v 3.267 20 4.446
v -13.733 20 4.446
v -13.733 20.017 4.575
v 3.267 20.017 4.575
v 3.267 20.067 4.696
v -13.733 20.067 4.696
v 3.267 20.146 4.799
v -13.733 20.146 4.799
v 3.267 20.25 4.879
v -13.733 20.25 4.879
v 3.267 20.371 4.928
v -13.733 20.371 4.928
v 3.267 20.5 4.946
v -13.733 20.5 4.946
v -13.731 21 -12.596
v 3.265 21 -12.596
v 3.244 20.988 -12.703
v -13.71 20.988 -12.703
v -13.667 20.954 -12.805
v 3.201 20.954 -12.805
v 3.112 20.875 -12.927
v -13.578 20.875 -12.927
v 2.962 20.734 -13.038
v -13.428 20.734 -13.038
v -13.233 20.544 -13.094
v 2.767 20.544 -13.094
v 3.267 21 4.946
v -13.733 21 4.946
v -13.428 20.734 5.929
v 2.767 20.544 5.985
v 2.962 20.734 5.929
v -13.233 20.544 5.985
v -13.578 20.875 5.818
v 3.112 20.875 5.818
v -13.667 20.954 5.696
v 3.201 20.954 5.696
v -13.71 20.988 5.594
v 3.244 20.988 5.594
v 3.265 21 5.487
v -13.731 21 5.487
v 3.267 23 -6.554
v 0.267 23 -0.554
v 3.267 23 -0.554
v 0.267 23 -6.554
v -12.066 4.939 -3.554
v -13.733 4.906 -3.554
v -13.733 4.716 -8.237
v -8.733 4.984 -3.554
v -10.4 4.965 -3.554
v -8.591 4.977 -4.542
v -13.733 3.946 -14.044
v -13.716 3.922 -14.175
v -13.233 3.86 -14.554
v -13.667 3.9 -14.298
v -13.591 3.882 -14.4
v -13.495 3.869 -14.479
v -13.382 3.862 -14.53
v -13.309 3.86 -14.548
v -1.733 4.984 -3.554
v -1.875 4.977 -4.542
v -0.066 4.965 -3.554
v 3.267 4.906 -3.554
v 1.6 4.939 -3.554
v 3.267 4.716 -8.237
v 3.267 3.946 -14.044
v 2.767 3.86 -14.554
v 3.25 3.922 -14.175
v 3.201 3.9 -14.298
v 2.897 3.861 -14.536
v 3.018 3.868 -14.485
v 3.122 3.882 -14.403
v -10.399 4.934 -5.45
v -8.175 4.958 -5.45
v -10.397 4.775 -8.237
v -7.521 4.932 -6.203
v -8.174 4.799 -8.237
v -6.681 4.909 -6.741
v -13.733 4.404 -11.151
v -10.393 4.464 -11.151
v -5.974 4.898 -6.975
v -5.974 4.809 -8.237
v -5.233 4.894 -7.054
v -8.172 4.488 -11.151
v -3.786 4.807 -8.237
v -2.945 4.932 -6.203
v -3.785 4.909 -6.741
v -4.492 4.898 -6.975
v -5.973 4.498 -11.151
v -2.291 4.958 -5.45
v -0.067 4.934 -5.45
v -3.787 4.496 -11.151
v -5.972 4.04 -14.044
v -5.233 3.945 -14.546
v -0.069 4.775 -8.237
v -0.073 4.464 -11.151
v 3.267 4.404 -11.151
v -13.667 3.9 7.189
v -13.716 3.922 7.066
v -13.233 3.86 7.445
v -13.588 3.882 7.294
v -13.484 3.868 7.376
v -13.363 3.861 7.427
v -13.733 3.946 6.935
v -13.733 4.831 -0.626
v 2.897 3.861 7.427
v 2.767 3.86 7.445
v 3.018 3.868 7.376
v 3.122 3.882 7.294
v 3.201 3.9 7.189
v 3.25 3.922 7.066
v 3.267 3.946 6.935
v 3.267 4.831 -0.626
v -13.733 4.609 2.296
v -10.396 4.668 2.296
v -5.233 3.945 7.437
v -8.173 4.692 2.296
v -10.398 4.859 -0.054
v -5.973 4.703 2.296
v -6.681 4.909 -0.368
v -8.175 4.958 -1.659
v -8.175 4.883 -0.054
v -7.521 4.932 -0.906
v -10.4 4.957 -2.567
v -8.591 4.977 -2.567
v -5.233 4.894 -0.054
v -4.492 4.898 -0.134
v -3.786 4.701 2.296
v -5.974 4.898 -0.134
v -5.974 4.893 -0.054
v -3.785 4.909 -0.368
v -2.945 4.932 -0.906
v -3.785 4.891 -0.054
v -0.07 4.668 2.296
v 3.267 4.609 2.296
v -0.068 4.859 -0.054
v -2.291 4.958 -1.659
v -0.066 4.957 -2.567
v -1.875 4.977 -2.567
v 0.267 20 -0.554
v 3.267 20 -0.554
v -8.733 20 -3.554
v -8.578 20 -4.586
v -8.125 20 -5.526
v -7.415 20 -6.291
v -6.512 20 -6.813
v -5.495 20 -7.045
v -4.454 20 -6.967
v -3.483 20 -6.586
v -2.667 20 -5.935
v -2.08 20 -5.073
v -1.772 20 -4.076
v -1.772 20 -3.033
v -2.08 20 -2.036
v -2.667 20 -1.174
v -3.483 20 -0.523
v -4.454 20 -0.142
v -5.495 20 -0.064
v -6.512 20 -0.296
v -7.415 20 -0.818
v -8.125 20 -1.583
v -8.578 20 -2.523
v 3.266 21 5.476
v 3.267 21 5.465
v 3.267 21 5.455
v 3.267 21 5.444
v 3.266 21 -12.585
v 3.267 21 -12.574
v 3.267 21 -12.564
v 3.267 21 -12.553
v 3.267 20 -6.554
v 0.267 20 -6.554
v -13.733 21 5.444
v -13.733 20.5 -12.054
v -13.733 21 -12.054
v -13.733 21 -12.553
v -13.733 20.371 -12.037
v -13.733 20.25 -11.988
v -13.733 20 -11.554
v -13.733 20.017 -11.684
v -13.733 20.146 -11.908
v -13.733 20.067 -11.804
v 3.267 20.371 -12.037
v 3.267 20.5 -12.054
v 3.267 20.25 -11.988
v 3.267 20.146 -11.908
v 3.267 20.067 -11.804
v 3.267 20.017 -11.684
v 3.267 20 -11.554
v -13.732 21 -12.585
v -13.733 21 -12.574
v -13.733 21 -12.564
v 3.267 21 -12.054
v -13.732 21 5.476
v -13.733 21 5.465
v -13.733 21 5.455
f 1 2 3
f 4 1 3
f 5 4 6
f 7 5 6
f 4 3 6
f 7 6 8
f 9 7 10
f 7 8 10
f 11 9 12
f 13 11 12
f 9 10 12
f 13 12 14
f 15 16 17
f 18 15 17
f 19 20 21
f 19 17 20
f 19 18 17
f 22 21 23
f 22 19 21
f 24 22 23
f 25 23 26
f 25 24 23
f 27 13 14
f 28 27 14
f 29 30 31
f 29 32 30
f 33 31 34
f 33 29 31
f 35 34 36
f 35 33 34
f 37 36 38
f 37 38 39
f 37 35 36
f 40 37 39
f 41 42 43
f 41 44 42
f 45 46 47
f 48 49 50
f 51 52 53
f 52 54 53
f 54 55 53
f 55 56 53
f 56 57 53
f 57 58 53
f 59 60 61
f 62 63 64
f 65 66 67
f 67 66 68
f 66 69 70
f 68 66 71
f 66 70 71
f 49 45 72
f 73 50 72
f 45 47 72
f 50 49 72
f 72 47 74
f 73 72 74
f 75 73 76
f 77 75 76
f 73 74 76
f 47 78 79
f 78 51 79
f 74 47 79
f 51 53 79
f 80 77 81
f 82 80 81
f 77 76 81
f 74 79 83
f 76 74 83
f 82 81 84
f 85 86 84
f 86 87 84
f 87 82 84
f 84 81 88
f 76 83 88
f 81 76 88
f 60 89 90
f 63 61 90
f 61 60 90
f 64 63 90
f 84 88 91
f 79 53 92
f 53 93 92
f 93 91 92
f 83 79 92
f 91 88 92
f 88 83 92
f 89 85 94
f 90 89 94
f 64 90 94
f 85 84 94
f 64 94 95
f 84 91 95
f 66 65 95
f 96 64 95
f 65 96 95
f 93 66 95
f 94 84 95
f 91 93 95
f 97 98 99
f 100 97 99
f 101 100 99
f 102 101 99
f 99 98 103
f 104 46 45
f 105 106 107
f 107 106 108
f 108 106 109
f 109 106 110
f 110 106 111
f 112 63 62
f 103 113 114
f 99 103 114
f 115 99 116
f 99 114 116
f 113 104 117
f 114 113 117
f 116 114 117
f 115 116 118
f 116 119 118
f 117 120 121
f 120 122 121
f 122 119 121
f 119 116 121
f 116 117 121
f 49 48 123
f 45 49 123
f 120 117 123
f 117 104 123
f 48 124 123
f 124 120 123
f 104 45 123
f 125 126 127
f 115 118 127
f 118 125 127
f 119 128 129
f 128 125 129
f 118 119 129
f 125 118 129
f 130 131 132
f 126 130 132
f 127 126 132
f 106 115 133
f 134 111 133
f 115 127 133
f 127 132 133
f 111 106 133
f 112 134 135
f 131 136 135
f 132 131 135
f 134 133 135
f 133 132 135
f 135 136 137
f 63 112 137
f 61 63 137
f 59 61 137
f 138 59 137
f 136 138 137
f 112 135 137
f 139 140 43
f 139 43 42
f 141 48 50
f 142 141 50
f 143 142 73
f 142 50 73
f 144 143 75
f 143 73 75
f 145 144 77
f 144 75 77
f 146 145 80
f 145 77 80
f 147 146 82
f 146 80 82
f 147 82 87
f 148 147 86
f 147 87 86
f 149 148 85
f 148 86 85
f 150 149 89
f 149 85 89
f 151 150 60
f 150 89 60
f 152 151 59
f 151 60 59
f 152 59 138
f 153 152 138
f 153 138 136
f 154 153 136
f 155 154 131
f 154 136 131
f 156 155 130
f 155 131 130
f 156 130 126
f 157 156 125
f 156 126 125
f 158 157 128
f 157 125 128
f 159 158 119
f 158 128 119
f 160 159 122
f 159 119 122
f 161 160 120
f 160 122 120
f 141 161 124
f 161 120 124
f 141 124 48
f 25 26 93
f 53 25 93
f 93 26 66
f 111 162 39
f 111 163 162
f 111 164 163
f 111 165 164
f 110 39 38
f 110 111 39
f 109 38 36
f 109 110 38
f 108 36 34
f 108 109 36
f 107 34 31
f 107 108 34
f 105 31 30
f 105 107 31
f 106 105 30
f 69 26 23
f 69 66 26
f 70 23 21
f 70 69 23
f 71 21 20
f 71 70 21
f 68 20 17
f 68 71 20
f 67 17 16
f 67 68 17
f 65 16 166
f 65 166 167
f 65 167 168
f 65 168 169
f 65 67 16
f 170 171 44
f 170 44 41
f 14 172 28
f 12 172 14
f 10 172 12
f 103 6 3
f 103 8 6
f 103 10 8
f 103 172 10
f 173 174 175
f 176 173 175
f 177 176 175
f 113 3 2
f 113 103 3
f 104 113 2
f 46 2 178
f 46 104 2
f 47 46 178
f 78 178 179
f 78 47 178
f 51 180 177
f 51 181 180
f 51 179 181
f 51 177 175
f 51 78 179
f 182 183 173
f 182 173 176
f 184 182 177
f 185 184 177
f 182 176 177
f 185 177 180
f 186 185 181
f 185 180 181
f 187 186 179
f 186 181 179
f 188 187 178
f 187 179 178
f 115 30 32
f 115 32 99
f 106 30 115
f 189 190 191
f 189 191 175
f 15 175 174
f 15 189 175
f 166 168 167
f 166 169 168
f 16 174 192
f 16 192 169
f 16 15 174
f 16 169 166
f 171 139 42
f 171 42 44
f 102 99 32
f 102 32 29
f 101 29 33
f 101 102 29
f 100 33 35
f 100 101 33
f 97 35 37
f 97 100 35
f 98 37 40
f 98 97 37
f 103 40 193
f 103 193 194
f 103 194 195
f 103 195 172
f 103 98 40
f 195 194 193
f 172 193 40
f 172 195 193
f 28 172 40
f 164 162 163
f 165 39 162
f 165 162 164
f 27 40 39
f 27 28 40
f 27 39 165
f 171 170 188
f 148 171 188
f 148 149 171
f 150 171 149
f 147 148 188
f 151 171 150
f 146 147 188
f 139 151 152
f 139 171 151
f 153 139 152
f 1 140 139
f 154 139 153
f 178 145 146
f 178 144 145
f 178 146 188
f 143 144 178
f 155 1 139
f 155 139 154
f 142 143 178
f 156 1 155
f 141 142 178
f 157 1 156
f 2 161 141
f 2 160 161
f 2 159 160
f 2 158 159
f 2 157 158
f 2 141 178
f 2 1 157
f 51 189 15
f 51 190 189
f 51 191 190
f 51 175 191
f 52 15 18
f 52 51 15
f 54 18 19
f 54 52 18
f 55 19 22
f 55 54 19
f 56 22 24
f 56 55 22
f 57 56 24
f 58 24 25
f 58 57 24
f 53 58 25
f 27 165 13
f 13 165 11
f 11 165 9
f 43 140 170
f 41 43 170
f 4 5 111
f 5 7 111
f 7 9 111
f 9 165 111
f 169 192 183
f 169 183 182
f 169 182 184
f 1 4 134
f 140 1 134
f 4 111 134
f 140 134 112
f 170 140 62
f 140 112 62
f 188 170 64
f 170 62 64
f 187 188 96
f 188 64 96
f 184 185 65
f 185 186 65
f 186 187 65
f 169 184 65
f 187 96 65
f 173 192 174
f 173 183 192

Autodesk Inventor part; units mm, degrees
ref_plane "YZ Plane" through (0, 0, 0) normal (1, 0, 0) x (0, 1, 0)
ref_plane "XZ Plane" through (0, 0, 0) normal (0, 1, 0) x (-1, 0, 0)
ref_plane "XY Plane" through (0, 0, 0) normal (0, 0, 1) x (1, 0, 0)
sketch "Sketch1" plane through (0, 0, 0) normal (0, 1, 0) x (-1, 0, 0)
  line L0 (5.232996, 7.4455) -> (-11.767004, 7.4455)
  line L1 (-11.767004, 7.4455) -> (-11.767004, -14.5545)
  line L2 (-11.767004, -14.5545) -> (5.232996, -14.5545)
  circle A0 centre (-3.267004, -3.5545) radius 3.5
  line L3 (5.232996, 7.4455) -> (5.232996, -14.5545)
  point P0 (0, 0)
  dimension "d2" = 22
  dimension "d3" = 17
  dimension "d8" = 7
  dimension "d10" = 11
  dimension "d11" = 8.5
extrude "Extrusion1" add sketch "Sketch1" along normal blind 20
sketch "Sketch2" plane through (0, 20, 0) normal (0, 1, 0) x (1, 0, 0)
  line L0 (-5.232996, -7.4455) -> (11.767004, -7.4455)
  line L1 (11.767004, -7.4455) -> (11.767004, 14.5545)
  line L2 (-5.232996, -7.4455) -> (11.767004, -7.4455)
  line L3 (11.767004, -7.4455) -> (11.767004, -4.9455)
  line L4 (11.767004, -4.9455) -> (-5.232996, -4.9455)
  line L5 (-5.232996, -4.9455) -> (-5.232996, -7.4455)
  line L6 (-5.232996, 14.5545) -> (-5.232996, -7.4455)
  line L7 (-5.232996, 14.5545) -> (11.767004, 14.5545)
  line L8 (11.767004, 14.5545) -> (11.767004, 12.0545)
  line L9 (11.767004, 12.0545) -> (-5.232996, 12.0545)
  line L10 (-5.232996, 12.0545) -> (-5.232996, 14.5545)
  line L11 (11.767004, 0.5545) -> (8.767004, 0.5545)
  line L12 (8.767004, 0.5545) -> (8.767004, 6.5545)
  line L13 (8.767004, 6.5545) -> (11.767004, 6.5545)
  line L14 (11.767004, 6.5545) -> (11.767004, 0.5545)
  line L15 (11.767004, 0.5545) -> (8.767004, 0.5545)
  line L16 (8.767004, 0.5545) -> (8.767004, 6.5545)
  line L17 (8.767004, 6.5545) -> (11.767004, 6.5545)
  line L18 (11.767004, 6.5545) -> (11.767004, 0.5545)
  point P0 (0, 0)
  dimension "d14" = 2.5
  dimension "d15" = 2.5
  dimension "d16" = 3
  dimension "d17" = 6
  dimension "d18" = 8
extrude "Extrusion2" add sketch "Sketch2" along normal blind 1 contours L5 L4 L1 L0 | L6 L7 L1 L9
sketch "Sketch3" plane through (0, 20, 0) normal (0, 1, 0) x (1, 0, 0)
  line L0 (11.767004, -4.9455) -> (11.767004, 12.0545)
  line L1 (11.767004, 0.5545) -> (8.767004, 0.5545)
  line L2 (8.767004, 0.5545) -> (8.767004, 6.5545)
  line L3 (8.767004, 6.5545) -> (11.767004, 6.5545)
  line L4 (11.767004, 6.5545) -> (11.767004, 0.5545)
  line L5 (-5.232996, -7.4455) -> (11.767004, -7.4455)
  point P0 (0, 0)
  dimension "d21" = 6
  dimension "d22" = 3
  dimension "d23" = 8
extrude "Extrusion3" add sketch "Sketch3" along normal blind 3
sketch "Sketch5" plane through (-5.232996, 0, -14.5545) normal (-1, 0, 0) x (0, 0, 1)
  line L0 (-21.5, -5) -> (43.5, -5)
  line L1 (11, -5) -> (11, 5)
  line L2 (0, 0) -> (0, 21)
  arc A0 (43.5, -5) -> (22, 3.943867) centre (11, -52.8125) ccw
  line L3 (2.5, 20) -> (19.5, 20)
  arc A1 (11, 5) -> (-21.5, -5) centre (11, -52.8125) ccw
  arc A2 (0, 3.943867) -> (-21.5, -5) centre (11, -52.8125) ccw
  line L4 (0, 0) -> (22, 0)
  line L5 (22, 0) -> (22, 3.943867)
  line L6 (22, 0) -> (0, 0)
  line L7 (0, 0) -> (0, 3.943867)
  arc A3 (22, 3.943867) -> (11, 5) centre (11, -52.8125) ccw
  line L8 (-15.777391, -378) -> (53.366362, -378)
  point P0 (14.5545, 0)
  dimension "d27" = 65
  dimension "d28" = 10
  dimension "d29" = 32.5
  dimension "d30" = 21.5
  dimension "d31" = 15
  dimension "d32" = 373
move or copy body "Move Body1" bodies to move or copy 1 copy no translate (-8.5, 0, 0)
revolve "Revolution1" cut sketch "Sketch5" angle 360 about axis through (-5.232996, -378, -30.331891) along (0, 0, 1)
fillet "Fillet2" radius 0.5 1 edges at (-5.233, 20, -12.0545)
fillet "Fillet3" radius 0.5 1 edges at (-5.233, 20, 4.9455)
sketch "Sketch6" plane through (3.267004, 21, -12.0545) normal (1, 0, 0) x (0, 0, -1)
  line L0 (-17, 0) -> (-19.5, 0)
  line L1 (-17, 0) -> (-18, 0)
  line L2 (-19.5, -17.150727) -> (-19.5, 0)
  line L3 (-18, 0) -> (-19.5, -17.150727)
  line L4 (-19.5, -17.150727) -> (-19.5, 0)
  line L5 (-19.5, 0) -> (-18, 0)
  line L6 (0, 0) -> (2.5, 0)
  line L7 (0, 0) -> (1, 0)
  line L8 (2.5, -17.150727) -> (2.5, 0)
  line L9 (1, 0) -> (2.5, -17.150727)
  line L10 (2.5, -17.150727) -> (2.5, 0)
  line L11 (2.5, 0) -> (1, 0)
  point P0 (-12.0545, -21)
  dimension "d40" = 1
  dimension "d41" = 1
extrude "Extrusion4" cut sketch "Sketch6" against normal up to next
fillet "Fillet4" radius 0.5 6 edges at (-5.233, 21, 5.9455) (3.267, 12.4246, 6.6955) (-13.733, 12.4246, 6.6955) (3.267, 12.4246, -13.8045) (-5.233, 21, -13.0545) (-13.733, 12.4246, -13.8045)
properties part number "upper_fender_spacer"
